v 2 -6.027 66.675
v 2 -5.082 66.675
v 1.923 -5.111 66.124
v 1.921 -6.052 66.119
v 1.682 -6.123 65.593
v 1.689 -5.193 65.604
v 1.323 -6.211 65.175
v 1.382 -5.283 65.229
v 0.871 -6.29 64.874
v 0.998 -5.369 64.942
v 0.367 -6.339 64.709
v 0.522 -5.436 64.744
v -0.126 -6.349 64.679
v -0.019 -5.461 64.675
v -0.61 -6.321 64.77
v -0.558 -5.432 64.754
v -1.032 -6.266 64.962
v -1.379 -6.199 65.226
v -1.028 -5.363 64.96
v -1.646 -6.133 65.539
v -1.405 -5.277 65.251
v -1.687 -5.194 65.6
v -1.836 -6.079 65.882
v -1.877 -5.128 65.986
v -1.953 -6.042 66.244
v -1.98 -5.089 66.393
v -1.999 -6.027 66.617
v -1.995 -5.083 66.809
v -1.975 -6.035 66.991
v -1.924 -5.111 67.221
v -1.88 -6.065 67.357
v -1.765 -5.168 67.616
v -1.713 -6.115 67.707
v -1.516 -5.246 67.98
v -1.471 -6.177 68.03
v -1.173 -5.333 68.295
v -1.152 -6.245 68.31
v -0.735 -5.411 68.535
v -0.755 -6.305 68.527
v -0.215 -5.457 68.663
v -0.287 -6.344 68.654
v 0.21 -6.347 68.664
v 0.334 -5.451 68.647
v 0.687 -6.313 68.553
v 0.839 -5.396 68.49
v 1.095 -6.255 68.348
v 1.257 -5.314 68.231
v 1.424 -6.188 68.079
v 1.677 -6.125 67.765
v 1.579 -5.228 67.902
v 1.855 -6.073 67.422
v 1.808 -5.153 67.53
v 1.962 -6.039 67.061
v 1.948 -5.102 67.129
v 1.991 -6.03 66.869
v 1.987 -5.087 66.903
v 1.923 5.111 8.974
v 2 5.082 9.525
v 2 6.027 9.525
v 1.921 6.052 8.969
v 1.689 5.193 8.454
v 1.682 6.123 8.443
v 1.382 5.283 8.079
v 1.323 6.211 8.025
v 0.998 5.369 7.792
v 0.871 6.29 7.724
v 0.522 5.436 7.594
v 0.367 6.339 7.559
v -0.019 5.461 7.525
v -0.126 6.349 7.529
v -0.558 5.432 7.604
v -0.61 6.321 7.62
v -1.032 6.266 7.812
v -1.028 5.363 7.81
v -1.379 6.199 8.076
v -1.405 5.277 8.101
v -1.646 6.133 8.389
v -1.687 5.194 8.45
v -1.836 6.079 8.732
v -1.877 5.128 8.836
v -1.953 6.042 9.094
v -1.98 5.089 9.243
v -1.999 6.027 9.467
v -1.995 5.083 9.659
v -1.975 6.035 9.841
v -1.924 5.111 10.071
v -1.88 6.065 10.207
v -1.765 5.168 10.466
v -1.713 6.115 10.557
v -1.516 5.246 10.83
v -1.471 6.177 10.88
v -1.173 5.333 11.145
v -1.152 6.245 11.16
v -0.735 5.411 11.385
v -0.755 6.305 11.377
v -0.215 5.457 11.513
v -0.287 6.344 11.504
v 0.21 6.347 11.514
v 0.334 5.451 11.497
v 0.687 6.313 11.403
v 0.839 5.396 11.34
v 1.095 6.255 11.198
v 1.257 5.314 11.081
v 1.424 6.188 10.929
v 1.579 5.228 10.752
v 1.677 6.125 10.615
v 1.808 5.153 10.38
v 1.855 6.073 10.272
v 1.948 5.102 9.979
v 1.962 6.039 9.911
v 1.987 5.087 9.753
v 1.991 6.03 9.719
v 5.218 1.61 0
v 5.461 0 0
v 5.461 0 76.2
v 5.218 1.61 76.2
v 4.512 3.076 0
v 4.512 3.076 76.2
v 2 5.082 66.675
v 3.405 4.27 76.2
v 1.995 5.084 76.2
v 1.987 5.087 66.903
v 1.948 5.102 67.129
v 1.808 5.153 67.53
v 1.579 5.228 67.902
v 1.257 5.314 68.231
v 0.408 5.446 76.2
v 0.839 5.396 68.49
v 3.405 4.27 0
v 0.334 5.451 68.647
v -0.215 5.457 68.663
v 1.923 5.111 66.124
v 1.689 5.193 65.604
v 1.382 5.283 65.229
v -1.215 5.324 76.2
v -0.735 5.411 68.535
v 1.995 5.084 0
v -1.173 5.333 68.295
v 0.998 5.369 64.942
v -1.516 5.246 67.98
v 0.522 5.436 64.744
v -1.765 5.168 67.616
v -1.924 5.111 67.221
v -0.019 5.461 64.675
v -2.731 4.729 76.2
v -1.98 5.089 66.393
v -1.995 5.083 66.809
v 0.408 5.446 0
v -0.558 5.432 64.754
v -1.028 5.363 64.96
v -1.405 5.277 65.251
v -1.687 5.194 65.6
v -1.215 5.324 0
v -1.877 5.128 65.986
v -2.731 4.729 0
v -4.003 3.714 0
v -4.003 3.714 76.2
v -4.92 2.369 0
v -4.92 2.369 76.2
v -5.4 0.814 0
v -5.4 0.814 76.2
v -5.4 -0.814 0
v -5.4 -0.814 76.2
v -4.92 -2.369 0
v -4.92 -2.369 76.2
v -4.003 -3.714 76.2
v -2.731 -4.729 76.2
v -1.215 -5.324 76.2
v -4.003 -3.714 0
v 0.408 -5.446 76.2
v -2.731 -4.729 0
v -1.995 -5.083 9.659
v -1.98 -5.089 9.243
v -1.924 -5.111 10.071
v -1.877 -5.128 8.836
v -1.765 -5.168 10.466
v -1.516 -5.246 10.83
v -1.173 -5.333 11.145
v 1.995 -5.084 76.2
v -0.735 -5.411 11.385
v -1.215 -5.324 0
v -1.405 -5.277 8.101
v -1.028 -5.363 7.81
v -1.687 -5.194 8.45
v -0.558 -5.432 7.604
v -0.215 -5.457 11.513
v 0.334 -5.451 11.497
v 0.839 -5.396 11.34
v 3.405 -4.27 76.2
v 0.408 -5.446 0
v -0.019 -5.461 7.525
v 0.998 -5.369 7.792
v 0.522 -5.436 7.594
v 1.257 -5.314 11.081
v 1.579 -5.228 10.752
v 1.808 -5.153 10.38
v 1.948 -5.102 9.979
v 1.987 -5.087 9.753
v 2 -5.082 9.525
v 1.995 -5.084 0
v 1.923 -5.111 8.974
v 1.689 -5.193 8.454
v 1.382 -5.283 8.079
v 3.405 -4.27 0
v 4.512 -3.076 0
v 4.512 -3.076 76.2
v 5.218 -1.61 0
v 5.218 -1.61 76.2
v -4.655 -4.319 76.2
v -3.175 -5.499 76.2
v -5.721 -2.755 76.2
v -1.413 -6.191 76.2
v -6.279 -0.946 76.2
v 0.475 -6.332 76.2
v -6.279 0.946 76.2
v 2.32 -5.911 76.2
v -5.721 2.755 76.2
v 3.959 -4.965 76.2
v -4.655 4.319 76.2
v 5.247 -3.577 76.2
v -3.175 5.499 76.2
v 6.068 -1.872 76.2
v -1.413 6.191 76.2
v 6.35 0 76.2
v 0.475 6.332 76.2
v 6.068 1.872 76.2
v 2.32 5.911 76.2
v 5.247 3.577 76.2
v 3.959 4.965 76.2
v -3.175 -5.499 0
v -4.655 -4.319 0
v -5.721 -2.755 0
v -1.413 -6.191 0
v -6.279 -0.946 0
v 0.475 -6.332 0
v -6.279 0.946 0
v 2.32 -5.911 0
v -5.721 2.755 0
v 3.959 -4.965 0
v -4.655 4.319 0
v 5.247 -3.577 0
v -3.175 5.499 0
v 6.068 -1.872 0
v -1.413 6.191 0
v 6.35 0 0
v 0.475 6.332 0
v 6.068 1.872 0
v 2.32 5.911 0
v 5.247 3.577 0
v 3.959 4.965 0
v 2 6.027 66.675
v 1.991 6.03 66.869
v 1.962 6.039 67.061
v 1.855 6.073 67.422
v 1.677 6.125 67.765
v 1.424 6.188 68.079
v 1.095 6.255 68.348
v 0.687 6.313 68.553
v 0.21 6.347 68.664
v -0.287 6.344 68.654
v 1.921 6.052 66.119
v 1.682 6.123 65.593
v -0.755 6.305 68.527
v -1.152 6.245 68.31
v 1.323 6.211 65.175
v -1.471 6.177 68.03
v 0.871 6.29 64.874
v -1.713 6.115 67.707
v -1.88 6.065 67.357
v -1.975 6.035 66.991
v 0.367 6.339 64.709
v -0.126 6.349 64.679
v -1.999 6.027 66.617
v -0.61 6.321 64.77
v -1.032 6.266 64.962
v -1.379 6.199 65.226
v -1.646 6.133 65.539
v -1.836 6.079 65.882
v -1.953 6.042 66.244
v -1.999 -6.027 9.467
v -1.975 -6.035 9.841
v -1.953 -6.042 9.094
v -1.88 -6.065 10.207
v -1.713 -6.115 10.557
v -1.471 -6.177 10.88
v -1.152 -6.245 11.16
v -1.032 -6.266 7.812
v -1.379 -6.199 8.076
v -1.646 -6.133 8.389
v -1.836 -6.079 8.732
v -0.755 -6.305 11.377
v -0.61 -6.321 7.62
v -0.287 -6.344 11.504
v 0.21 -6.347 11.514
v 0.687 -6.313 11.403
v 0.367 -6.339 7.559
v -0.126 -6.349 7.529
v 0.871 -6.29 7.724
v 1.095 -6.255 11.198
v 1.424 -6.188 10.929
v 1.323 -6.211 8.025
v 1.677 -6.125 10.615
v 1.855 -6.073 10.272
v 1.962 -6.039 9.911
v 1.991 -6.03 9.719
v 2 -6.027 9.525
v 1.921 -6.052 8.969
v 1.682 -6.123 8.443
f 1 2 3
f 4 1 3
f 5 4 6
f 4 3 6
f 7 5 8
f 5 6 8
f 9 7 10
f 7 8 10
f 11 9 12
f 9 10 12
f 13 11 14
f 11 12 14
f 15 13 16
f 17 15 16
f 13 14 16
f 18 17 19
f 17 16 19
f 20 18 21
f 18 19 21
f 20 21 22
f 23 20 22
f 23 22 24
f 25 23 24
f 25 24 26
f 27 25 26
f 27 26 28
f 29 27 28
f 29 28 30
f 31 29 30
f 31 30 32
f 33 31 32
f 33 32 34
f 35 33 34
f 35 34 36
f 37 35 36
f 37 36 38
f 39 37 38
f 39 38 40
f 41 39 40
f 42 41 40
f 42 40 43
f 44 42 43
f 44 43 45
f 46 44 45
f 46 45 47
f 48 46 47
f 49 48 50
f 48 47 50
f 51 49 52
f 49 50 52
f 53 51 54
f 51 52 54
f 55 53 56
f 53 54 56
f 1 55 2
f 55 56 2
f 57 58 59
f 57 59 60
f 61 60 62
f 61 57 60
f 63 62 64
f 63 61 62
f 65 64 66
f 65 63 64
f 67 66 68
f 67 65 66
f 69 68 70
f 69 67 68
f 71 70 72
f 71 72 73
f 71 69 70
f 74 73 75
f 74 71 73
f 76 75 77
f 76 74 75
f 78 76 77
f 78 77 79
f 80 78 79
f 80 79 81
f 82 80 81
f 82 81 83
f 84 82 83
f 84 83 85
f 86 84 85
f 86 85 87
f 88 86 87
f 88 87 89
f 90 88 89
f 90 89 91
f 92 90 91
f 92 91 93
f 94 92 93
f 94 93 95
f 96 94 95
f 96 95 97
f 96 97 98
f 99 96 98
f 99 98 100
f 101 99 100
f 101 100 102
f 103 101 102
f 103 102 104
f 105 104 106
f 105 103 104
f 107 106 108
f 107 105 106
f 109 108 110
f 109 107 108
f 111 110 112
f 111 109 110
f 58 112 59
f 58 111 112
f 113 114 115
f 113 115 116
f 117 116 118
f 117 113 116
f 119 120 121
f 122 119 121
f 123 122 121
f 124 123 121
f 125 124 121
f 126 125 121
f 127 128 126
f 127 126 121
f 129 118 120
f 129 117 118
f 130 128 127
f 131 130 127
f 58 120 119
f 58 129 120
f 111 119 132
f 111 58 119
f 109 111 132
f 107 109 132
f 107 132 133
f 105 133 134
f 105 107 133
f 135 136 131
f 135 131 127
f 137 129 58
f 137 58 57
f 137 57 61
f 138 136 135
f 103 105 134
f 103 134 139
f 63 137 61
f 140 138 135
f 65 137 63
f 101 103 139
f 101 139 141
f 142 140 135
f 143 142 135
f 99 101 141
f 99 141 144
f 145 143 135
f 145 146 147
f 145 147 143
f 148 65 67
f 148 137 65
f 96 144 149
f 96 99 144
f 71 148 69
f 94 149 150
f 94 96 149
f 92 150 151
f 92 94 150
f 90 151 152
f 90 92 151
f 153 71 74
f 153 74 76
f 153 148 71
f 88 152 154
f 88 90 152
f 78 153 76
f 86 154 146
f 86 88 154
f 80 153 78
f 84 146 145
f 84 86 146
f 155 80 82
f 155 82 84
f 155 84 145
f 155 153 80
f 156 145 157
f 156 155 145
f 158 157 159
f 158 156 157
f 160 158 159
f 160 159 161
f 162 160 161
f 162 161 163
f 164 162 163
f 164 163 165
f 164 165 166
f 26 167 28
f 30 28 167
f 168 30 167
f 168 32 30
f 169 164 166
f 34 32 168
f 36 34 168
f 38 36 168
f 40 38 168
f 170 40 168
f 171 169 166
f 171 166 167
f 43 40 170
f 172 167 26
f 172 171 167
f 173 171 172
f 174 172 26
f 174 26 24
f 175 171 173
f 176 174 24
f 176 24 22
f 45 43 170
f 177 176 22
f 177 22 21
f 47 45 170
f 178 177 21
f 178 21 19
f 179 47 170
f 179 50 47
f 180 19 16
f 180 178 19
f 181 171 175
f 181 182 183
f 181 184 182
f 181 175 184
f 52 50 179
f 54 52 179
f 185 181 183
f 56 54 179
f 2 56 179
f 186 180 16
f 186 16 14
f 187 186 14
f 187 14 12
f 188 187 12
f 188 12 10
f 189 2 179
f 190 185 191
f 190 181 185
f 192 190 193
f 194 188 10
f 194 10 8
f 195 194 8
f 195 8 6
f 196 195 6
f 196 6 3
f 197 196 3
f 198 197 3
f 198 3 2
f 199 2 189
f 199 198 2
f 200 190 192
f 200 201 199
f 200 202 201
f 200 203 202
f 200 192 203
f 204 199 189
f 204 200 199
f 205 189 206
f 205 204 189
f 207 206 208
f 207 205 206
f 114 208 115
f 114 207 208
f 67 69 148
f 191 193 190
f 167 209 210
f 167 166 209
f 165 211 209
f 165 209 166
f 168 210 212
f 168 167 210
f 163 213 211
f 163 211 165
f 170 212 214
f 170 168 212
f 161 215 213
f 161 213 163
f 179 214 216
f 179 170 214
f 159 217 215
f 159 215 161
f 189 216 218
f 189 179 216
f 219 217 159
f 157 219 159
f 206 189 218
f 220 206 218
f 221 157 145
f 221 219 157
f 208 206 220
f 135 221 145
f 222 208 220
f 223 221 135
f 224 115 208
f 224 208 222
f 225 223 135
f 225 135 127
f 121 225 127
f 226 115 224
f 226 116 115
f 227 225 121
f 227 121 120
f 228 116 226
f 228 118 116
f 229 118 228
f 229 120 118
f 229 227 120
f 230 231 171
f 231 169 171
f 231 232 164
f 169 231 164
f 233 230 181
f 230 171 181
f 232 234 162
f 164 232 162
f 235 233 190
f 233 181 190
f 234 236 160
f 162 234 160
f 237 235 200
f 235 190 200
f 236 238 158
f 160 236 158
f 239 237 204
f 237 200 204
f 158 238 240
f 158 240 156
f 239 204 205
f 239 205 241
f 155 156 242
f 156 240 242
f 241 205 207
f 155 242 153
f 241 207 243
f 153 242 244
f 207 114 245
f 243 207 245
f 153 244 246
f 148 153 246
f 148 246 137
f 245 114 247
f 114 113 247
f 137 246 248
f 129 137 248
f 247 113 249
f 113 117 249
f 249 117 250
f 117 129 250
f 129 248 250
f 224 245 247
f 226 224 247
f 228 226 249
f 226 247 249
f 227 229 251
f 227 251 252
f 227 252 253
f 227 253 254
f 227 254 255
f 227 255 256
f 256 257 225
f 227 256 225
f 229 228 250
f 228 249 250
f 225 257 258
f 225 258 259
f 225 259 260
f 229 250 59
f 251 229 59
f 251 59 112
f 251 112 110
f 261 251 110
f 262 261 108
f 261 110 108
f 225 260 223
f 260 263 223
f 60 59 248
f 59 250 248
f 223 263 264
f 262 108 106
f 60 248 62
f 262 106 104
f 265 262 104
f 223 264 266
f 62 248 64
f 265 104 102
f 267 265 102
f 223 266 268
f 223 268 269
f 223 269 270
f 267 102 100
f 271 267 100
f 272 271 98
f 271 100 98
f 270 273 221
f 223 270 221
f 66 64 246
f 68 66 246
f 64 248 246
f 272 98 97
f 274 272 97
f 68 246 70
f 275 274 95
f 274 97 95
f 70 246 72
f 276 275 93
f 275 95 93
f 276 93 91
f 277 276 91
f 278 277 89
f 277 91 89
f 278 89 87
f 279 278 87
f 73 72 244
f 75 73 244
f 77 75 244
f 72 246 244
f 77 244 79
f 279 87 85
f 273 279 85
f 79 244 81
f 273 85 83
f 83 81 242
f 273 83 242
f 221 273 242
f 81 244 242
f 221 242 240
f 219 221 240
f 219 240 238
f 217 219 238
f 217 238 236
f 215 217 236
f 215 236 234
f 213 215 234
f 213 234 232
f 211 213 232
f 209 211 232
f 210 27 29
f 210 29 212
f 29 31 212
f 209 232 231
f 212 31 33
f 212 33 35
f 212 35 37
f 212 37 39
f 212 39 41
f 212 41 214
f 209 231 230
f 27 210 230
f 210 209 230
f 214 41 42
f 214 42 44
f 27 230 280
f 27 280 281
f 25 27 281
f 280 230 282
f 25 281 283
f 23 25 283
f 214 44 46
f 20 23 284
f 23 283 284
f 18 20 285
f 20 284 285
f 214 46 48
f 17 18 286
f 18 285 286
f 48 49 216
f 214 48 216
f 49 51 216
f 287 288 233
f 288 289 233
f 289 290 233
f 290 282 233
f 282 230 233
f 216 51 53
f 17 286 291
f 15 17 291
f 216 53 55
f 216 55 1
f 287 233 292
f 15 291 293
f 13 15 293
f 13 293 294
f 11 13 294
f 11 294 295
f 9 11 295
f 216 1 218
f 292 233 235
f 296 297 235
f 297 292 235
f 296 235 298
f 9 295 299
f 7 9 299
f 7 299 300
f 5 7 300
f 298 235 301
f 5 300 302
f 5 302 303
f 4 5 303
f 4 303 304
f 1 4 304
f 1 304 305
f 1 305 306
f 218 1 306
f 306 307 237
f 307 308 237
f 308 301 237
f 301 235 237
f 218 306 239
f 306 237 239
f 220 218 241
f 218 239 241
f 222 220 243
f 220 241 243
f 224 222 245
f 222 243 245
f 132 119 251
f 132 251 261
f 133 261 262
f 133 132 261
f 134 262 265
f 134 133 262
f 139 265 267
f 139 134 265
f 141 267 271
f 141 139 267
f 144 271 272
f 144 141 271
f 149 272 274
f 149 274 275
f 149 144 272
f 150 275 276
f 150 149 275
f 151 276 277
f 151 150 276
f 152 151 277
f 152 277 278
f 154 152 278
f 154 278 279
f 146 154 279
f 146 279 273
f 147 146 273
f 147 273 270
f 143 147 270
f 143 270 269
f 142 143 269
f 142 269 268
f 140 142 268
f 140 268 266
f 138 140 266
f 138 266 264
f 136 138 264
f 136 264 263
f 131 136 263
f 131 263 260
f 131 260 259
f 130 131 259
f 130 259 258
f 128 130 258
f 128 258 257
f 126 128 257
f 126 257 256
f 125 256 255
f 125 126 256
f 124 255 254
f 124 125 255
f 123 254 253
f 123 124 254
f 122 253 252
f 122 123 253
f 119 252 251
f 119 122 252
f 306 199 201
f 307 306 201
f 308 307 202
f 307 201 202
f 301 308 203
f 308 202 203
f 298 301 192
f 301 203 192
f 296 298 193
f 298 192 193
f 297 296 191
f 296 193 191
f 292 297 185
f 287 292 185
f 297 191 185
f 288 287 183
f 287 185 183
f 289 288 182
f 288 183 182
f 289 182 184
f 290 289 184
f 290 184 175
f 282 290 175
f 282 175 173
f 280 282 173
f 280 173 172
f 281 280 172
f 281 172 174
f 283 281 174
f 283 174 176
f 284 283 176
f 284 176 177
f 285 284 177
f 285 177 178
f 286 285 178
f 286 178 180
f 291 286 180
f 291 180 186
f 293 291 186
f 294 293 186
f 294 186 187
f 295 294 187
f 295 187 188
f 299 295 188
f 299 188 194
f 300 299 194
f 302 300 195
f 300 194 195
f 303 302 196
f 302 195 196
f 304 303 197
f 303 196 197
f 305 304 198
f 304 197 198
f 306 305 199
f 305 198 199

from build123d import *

# Parameters (mm, degrees)
SKETCH1_R               = 6.35
SKETCH1_R_2             = 5.461
EXTRUDE1_DEPTH          = 76.2
CUT_EXTRUDE1_DEPTH      = 38.1
CUT_EXTRUDE1_DEPTH_BACK = 38.1
SKETCH2_R               = 2


with BuildPart() as part:
    # Sketch1 → Extrude1 (new body)
    with BuildSketch(Plane.XY):
        Circle(SKETCH1_R)
        Circle(SKETCH1_R_2, mode=Mode.SUBTRACT)
    extrude(amount=EXTRUDE1_DEPTH)

    # Sketch2 → Cut-Extrude1 (cut, two sides: drawn at the far end of the back side and taken through both)
    with BuildSketch(Plane(origin=(0, 0, 0), x_dir=(1, 0, 0), z_dir=(0, 1, 0)).offset(-CUT_EXTRUDE1_DEPTH_BACK)):
        with Locations((0, -9.525)):
            Circle(SKETCH2_R)
        with Locations((0, -66.675)):
            Circle(SKETCH2_R)
    extrude(amount=CUT_EXTRUDE1_DEPTH + CUT_EXTRUDE1_DEPTH_BACK, mode=Mode.SUBTRACT)


solid = part.part
